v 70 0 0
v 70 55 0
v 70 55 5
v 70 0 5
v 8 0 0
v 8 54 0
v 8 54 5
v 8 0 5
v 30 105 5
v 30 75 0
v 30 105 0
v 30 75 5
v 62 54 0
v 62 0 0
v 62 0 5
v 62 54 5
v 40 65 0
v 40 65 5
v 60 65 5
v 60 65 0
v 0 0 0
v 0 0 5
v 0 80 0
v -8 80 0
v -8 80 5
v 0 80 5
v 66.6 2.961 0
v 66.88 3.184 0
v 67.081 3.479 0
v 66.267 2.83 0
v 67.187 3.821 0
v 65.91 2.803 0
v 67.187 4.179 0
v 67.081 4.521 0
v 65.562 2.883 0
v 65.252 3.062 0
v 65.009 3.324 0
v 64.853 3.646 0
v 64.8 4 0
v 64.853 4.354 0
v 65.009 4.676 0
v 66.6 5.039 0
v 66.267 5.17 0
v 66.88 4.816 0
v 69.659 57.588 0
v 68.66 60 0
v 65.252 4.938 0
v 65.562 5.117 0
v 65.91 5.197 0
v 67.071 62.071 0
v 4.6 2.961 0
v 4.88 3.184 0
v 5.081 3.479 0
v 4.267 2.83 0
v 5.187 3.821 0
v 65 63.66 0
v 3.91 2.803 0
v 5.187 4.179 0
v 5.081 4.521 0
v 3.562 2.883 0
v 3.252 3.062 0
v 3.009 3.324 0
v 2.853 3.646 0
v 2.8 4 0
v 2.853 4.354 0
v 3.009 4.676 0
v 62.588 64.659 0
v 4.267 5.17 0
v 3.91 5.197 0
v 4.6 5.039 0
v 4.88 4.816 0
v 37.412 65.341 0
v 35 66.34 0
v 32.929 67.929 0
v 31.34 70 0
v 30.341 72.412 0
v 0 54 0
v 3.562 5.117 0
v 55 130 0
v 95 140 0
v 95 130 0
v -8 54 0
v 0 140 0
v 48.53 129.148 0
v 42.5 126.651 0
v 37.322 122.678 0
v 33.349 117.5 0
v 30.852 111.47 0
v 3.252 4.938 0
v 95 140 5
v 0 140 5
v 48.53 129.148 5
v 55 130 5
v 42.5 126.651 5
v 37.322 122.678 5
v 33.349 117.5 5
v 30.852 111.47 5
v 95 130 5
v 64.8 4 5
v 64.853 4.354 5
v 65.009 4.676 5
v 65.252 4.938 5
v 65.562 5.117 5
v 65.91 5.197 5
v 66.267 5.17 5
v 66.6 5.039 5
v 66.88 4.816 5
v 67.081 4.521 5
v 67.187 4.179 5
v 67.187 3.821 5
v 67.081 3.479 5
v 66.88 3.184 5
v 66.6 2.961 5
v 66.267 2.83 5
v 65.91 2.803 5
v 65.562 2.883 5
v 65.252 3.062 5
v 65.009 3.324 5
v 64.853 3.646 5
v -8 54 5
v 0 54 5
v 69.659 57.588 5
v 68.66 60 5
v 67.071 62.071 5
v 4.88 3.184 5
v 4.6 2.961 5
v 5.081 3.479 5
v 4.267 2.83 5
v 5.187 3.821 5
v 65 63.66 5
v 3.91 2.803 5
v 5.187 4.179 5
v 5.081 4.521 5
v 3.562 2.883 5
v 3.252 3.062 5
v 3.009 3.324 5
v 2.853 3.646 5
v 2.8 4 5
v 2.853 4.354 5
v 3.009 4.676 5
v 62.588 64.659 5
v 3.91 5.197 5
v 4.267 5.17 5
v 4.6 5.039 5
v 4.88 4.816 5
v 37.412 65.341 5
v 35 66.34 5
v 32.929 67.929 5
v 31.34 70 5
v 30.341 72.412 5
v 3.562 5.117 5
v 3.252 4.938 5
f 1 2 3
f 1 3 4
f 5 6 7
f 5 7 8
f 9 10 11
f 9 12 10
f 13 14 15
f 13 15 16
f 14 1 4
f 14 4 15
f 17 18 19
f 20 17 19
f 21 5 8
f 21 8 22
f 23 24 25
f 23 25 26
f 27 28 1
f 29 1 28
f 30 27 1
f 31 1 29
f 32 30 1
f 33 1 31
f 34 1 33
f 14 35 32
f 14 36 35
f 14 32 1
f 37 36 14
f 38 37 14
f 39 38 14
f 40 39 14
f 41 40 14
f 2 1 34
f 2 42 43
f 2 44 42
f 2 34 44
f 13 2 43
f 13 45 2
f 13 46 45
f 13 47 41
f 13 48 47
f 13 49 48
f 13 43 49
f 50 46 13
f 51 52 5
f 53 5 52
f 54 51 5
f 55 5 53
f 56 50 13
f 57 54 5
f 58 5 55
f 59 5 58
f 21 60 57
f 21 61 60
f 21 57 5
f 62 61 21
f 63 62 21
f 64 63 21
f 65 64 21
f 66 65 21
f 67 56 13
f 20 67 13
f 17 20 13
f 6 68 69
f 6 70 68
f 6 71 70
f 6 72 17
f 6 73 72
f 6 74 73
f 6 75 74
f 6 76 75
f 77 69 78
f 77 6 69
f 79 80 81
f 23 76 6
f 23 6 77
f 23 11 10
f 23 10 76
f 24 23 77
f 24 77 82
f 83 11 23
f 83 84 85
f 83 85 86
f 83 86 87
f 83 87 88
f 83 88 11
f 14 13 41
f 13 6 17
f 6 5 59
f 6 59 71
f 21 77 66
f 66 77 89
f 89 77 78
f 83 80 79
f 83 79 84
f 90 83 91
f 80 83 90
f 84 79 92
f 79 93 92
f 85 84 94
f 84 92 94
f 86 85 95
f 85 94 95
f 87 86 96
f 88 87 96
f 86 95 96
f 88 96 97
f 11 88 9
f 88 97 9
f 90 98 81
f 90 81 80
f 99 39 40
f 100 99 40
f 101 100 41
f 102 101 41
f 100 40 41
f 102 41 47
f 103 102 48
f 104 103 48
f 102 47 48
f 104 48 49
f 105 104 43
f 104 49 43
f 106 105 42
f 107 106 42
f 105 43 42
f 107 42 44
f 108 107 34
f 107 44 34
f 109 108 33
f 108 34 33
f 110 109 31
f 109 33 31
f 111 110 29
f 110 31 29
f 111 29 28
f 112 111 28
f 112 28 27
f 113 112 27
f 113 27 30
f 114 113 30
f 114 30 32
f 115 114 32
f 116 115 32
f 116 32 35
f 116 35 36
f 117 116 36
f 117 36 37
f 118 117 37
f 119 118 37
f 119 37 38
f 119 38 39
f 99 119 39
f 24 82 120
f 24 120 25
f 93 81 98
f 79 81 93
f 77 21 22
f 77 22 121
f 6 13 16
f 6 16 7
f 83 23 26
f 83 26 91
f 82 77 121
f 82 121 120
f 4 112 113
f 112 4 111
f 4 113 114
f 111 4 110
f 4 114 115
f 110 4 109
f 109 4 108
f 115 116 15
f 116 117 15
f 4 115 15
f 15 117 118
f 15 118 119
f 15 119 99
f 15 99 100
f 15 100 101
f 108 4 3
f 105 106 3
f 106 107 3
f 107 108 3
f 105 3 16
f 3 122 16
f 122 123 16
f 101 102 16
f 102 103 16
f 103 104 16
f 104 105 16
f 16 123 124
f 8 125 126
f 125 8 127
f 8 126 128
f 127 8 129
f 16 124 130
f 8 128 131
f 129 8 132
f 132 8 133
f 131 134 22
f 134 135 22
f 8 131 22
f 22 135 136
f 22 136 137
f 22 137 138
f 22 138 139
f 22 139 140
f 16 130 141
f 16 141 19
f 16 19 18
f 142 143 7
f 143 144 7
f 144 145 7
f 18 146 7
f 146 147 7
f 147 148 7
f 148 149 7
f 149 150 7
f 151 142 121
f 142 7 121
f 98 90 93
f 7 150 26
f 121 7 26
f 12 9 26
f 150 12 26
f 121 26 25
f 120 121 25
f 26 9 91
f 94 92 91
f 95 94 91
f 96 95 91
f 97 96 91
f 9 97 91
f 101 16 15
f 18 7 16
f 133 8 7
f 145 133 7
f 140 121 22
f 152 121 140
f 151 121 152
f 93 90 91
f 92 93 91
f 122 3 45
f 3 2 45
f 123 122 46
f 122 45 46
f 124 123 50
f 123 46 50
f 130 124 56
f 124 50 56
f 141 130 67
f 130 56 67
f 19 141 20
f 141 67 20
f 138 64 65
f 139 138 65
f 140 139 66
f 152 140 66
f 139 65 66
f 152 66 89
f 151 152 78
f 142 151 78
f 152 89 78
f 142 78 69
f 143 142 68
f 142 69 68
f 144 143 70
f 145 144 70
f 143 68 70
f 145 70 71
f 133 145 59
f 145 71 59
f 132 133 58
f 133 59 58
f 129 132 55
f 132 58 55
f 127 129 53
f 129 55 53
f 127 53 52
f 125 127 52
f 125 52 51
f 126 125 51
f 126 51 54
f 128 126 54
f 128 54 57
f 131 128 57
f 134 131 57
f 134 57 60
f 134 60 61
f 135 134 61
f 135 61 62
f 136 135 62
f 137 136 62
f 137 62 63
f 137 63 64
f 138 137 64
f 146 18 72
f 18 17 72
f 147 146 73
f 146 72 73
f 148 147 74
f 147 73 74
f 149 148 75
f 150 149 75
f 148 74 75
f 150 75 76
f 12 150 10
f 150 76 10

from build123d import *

# Parameters (mm, degrees)
BOSS_EXTRU_1_DEPTH      = 5
CONG_2_R                = 25
ESQUISSE5_W             = 40
ESQUISSE5_H             = 15
ENL_V_MAT_EXTRU_1_DEPTH = 5
CONG_3_R                = 10
ESQUISSE2_R             = 1
ENL_V_MAT_EXTRU_5_DEPTH = 10
D_GAGEMENT_M21_D        = 2.4
ESQUISSE9_W             = 25
ESQUISSE9_H             = 10
ENL_V_MAT_EXTRU_6_DEPTH = 5


with BuildPart() as part:
    # Esquisse1 → Boss.-Extru.1 (new body)
    with BuildSketch(Plane.XY):
        Polygon((0, 0), (0, 54), (-8, 54), (-8, 80), (0, 80), (0, 140), (120, 140), (120, 130), (30, 130), (30, 80), (70, 80), (70, 0), (62, 0), (62, 54), (8, 54), (8, 0), align=None)
    extrude(amount=BOSS_EXTRU_1_DEPTH)

    # Congé2
    cong_2_edges = [part.edges().sort_by_distance(p)[0] for p in [
        (30, 130, 2.5),
    ]]
    fillet(cong_2_edges, radius=CONG_2_R)

    # Esquisse5 → Enlèv. mat.-Extru.1 (cut)
    with BuildSketch(Plane.XY.offset(5)):
        with Locations((50, 72.5)):
            Rectangle(ESQUISSE5_W, ESQUISSE5_H)
    extrude(amount=-ENL_V_MAT_EXTRU_1_DEPTH, mode=Mode.SUBTRACT)

    # Congé3
    cong_3_edges = [part.edges().sort_by_distance(p)[0] for p in [
        (70, 65, 2.5),
        (30, 65, 2.5),
    ]]
    fillet(cong_3_edges, radius=CONG_3_R)

    # Esquisse2 → Enlèv. mat.-Extru.5 (cut)
    with BuildSketch(Plane.XY.offset(5)):
        with Locations((4, 4)):
            Circle(ESQUISSE2_R)
        with Locations((66, 4)):
            Circle(ESQUISSE2_R)
    extrude(amount=-ENL_V_MAT_EXTRU_5_DEPTH, mode=Mode.SUBTRACT)

    # Dégagement M21 (through all)
    with Locations(Plane.XY.offset(5)):
        with Locations((4, 4), (66, 4)):
            Hole(D_GAGEMENT_M21_D / 2)

    # Esquisse9 → Enlèv. mat.-Extru.6 (cut)
    with BuildSketch(Plane.XY.offset(5)):
        with Locations((107.5, 135)):
            Rectangle(ESQUISSE9_W, ESQUISSE9_H)
    extrude(amount=-ENL_V_MAT_EXTRU_6_DEPTH, mode=Mode.SUBTRACT)


solid = part.part
